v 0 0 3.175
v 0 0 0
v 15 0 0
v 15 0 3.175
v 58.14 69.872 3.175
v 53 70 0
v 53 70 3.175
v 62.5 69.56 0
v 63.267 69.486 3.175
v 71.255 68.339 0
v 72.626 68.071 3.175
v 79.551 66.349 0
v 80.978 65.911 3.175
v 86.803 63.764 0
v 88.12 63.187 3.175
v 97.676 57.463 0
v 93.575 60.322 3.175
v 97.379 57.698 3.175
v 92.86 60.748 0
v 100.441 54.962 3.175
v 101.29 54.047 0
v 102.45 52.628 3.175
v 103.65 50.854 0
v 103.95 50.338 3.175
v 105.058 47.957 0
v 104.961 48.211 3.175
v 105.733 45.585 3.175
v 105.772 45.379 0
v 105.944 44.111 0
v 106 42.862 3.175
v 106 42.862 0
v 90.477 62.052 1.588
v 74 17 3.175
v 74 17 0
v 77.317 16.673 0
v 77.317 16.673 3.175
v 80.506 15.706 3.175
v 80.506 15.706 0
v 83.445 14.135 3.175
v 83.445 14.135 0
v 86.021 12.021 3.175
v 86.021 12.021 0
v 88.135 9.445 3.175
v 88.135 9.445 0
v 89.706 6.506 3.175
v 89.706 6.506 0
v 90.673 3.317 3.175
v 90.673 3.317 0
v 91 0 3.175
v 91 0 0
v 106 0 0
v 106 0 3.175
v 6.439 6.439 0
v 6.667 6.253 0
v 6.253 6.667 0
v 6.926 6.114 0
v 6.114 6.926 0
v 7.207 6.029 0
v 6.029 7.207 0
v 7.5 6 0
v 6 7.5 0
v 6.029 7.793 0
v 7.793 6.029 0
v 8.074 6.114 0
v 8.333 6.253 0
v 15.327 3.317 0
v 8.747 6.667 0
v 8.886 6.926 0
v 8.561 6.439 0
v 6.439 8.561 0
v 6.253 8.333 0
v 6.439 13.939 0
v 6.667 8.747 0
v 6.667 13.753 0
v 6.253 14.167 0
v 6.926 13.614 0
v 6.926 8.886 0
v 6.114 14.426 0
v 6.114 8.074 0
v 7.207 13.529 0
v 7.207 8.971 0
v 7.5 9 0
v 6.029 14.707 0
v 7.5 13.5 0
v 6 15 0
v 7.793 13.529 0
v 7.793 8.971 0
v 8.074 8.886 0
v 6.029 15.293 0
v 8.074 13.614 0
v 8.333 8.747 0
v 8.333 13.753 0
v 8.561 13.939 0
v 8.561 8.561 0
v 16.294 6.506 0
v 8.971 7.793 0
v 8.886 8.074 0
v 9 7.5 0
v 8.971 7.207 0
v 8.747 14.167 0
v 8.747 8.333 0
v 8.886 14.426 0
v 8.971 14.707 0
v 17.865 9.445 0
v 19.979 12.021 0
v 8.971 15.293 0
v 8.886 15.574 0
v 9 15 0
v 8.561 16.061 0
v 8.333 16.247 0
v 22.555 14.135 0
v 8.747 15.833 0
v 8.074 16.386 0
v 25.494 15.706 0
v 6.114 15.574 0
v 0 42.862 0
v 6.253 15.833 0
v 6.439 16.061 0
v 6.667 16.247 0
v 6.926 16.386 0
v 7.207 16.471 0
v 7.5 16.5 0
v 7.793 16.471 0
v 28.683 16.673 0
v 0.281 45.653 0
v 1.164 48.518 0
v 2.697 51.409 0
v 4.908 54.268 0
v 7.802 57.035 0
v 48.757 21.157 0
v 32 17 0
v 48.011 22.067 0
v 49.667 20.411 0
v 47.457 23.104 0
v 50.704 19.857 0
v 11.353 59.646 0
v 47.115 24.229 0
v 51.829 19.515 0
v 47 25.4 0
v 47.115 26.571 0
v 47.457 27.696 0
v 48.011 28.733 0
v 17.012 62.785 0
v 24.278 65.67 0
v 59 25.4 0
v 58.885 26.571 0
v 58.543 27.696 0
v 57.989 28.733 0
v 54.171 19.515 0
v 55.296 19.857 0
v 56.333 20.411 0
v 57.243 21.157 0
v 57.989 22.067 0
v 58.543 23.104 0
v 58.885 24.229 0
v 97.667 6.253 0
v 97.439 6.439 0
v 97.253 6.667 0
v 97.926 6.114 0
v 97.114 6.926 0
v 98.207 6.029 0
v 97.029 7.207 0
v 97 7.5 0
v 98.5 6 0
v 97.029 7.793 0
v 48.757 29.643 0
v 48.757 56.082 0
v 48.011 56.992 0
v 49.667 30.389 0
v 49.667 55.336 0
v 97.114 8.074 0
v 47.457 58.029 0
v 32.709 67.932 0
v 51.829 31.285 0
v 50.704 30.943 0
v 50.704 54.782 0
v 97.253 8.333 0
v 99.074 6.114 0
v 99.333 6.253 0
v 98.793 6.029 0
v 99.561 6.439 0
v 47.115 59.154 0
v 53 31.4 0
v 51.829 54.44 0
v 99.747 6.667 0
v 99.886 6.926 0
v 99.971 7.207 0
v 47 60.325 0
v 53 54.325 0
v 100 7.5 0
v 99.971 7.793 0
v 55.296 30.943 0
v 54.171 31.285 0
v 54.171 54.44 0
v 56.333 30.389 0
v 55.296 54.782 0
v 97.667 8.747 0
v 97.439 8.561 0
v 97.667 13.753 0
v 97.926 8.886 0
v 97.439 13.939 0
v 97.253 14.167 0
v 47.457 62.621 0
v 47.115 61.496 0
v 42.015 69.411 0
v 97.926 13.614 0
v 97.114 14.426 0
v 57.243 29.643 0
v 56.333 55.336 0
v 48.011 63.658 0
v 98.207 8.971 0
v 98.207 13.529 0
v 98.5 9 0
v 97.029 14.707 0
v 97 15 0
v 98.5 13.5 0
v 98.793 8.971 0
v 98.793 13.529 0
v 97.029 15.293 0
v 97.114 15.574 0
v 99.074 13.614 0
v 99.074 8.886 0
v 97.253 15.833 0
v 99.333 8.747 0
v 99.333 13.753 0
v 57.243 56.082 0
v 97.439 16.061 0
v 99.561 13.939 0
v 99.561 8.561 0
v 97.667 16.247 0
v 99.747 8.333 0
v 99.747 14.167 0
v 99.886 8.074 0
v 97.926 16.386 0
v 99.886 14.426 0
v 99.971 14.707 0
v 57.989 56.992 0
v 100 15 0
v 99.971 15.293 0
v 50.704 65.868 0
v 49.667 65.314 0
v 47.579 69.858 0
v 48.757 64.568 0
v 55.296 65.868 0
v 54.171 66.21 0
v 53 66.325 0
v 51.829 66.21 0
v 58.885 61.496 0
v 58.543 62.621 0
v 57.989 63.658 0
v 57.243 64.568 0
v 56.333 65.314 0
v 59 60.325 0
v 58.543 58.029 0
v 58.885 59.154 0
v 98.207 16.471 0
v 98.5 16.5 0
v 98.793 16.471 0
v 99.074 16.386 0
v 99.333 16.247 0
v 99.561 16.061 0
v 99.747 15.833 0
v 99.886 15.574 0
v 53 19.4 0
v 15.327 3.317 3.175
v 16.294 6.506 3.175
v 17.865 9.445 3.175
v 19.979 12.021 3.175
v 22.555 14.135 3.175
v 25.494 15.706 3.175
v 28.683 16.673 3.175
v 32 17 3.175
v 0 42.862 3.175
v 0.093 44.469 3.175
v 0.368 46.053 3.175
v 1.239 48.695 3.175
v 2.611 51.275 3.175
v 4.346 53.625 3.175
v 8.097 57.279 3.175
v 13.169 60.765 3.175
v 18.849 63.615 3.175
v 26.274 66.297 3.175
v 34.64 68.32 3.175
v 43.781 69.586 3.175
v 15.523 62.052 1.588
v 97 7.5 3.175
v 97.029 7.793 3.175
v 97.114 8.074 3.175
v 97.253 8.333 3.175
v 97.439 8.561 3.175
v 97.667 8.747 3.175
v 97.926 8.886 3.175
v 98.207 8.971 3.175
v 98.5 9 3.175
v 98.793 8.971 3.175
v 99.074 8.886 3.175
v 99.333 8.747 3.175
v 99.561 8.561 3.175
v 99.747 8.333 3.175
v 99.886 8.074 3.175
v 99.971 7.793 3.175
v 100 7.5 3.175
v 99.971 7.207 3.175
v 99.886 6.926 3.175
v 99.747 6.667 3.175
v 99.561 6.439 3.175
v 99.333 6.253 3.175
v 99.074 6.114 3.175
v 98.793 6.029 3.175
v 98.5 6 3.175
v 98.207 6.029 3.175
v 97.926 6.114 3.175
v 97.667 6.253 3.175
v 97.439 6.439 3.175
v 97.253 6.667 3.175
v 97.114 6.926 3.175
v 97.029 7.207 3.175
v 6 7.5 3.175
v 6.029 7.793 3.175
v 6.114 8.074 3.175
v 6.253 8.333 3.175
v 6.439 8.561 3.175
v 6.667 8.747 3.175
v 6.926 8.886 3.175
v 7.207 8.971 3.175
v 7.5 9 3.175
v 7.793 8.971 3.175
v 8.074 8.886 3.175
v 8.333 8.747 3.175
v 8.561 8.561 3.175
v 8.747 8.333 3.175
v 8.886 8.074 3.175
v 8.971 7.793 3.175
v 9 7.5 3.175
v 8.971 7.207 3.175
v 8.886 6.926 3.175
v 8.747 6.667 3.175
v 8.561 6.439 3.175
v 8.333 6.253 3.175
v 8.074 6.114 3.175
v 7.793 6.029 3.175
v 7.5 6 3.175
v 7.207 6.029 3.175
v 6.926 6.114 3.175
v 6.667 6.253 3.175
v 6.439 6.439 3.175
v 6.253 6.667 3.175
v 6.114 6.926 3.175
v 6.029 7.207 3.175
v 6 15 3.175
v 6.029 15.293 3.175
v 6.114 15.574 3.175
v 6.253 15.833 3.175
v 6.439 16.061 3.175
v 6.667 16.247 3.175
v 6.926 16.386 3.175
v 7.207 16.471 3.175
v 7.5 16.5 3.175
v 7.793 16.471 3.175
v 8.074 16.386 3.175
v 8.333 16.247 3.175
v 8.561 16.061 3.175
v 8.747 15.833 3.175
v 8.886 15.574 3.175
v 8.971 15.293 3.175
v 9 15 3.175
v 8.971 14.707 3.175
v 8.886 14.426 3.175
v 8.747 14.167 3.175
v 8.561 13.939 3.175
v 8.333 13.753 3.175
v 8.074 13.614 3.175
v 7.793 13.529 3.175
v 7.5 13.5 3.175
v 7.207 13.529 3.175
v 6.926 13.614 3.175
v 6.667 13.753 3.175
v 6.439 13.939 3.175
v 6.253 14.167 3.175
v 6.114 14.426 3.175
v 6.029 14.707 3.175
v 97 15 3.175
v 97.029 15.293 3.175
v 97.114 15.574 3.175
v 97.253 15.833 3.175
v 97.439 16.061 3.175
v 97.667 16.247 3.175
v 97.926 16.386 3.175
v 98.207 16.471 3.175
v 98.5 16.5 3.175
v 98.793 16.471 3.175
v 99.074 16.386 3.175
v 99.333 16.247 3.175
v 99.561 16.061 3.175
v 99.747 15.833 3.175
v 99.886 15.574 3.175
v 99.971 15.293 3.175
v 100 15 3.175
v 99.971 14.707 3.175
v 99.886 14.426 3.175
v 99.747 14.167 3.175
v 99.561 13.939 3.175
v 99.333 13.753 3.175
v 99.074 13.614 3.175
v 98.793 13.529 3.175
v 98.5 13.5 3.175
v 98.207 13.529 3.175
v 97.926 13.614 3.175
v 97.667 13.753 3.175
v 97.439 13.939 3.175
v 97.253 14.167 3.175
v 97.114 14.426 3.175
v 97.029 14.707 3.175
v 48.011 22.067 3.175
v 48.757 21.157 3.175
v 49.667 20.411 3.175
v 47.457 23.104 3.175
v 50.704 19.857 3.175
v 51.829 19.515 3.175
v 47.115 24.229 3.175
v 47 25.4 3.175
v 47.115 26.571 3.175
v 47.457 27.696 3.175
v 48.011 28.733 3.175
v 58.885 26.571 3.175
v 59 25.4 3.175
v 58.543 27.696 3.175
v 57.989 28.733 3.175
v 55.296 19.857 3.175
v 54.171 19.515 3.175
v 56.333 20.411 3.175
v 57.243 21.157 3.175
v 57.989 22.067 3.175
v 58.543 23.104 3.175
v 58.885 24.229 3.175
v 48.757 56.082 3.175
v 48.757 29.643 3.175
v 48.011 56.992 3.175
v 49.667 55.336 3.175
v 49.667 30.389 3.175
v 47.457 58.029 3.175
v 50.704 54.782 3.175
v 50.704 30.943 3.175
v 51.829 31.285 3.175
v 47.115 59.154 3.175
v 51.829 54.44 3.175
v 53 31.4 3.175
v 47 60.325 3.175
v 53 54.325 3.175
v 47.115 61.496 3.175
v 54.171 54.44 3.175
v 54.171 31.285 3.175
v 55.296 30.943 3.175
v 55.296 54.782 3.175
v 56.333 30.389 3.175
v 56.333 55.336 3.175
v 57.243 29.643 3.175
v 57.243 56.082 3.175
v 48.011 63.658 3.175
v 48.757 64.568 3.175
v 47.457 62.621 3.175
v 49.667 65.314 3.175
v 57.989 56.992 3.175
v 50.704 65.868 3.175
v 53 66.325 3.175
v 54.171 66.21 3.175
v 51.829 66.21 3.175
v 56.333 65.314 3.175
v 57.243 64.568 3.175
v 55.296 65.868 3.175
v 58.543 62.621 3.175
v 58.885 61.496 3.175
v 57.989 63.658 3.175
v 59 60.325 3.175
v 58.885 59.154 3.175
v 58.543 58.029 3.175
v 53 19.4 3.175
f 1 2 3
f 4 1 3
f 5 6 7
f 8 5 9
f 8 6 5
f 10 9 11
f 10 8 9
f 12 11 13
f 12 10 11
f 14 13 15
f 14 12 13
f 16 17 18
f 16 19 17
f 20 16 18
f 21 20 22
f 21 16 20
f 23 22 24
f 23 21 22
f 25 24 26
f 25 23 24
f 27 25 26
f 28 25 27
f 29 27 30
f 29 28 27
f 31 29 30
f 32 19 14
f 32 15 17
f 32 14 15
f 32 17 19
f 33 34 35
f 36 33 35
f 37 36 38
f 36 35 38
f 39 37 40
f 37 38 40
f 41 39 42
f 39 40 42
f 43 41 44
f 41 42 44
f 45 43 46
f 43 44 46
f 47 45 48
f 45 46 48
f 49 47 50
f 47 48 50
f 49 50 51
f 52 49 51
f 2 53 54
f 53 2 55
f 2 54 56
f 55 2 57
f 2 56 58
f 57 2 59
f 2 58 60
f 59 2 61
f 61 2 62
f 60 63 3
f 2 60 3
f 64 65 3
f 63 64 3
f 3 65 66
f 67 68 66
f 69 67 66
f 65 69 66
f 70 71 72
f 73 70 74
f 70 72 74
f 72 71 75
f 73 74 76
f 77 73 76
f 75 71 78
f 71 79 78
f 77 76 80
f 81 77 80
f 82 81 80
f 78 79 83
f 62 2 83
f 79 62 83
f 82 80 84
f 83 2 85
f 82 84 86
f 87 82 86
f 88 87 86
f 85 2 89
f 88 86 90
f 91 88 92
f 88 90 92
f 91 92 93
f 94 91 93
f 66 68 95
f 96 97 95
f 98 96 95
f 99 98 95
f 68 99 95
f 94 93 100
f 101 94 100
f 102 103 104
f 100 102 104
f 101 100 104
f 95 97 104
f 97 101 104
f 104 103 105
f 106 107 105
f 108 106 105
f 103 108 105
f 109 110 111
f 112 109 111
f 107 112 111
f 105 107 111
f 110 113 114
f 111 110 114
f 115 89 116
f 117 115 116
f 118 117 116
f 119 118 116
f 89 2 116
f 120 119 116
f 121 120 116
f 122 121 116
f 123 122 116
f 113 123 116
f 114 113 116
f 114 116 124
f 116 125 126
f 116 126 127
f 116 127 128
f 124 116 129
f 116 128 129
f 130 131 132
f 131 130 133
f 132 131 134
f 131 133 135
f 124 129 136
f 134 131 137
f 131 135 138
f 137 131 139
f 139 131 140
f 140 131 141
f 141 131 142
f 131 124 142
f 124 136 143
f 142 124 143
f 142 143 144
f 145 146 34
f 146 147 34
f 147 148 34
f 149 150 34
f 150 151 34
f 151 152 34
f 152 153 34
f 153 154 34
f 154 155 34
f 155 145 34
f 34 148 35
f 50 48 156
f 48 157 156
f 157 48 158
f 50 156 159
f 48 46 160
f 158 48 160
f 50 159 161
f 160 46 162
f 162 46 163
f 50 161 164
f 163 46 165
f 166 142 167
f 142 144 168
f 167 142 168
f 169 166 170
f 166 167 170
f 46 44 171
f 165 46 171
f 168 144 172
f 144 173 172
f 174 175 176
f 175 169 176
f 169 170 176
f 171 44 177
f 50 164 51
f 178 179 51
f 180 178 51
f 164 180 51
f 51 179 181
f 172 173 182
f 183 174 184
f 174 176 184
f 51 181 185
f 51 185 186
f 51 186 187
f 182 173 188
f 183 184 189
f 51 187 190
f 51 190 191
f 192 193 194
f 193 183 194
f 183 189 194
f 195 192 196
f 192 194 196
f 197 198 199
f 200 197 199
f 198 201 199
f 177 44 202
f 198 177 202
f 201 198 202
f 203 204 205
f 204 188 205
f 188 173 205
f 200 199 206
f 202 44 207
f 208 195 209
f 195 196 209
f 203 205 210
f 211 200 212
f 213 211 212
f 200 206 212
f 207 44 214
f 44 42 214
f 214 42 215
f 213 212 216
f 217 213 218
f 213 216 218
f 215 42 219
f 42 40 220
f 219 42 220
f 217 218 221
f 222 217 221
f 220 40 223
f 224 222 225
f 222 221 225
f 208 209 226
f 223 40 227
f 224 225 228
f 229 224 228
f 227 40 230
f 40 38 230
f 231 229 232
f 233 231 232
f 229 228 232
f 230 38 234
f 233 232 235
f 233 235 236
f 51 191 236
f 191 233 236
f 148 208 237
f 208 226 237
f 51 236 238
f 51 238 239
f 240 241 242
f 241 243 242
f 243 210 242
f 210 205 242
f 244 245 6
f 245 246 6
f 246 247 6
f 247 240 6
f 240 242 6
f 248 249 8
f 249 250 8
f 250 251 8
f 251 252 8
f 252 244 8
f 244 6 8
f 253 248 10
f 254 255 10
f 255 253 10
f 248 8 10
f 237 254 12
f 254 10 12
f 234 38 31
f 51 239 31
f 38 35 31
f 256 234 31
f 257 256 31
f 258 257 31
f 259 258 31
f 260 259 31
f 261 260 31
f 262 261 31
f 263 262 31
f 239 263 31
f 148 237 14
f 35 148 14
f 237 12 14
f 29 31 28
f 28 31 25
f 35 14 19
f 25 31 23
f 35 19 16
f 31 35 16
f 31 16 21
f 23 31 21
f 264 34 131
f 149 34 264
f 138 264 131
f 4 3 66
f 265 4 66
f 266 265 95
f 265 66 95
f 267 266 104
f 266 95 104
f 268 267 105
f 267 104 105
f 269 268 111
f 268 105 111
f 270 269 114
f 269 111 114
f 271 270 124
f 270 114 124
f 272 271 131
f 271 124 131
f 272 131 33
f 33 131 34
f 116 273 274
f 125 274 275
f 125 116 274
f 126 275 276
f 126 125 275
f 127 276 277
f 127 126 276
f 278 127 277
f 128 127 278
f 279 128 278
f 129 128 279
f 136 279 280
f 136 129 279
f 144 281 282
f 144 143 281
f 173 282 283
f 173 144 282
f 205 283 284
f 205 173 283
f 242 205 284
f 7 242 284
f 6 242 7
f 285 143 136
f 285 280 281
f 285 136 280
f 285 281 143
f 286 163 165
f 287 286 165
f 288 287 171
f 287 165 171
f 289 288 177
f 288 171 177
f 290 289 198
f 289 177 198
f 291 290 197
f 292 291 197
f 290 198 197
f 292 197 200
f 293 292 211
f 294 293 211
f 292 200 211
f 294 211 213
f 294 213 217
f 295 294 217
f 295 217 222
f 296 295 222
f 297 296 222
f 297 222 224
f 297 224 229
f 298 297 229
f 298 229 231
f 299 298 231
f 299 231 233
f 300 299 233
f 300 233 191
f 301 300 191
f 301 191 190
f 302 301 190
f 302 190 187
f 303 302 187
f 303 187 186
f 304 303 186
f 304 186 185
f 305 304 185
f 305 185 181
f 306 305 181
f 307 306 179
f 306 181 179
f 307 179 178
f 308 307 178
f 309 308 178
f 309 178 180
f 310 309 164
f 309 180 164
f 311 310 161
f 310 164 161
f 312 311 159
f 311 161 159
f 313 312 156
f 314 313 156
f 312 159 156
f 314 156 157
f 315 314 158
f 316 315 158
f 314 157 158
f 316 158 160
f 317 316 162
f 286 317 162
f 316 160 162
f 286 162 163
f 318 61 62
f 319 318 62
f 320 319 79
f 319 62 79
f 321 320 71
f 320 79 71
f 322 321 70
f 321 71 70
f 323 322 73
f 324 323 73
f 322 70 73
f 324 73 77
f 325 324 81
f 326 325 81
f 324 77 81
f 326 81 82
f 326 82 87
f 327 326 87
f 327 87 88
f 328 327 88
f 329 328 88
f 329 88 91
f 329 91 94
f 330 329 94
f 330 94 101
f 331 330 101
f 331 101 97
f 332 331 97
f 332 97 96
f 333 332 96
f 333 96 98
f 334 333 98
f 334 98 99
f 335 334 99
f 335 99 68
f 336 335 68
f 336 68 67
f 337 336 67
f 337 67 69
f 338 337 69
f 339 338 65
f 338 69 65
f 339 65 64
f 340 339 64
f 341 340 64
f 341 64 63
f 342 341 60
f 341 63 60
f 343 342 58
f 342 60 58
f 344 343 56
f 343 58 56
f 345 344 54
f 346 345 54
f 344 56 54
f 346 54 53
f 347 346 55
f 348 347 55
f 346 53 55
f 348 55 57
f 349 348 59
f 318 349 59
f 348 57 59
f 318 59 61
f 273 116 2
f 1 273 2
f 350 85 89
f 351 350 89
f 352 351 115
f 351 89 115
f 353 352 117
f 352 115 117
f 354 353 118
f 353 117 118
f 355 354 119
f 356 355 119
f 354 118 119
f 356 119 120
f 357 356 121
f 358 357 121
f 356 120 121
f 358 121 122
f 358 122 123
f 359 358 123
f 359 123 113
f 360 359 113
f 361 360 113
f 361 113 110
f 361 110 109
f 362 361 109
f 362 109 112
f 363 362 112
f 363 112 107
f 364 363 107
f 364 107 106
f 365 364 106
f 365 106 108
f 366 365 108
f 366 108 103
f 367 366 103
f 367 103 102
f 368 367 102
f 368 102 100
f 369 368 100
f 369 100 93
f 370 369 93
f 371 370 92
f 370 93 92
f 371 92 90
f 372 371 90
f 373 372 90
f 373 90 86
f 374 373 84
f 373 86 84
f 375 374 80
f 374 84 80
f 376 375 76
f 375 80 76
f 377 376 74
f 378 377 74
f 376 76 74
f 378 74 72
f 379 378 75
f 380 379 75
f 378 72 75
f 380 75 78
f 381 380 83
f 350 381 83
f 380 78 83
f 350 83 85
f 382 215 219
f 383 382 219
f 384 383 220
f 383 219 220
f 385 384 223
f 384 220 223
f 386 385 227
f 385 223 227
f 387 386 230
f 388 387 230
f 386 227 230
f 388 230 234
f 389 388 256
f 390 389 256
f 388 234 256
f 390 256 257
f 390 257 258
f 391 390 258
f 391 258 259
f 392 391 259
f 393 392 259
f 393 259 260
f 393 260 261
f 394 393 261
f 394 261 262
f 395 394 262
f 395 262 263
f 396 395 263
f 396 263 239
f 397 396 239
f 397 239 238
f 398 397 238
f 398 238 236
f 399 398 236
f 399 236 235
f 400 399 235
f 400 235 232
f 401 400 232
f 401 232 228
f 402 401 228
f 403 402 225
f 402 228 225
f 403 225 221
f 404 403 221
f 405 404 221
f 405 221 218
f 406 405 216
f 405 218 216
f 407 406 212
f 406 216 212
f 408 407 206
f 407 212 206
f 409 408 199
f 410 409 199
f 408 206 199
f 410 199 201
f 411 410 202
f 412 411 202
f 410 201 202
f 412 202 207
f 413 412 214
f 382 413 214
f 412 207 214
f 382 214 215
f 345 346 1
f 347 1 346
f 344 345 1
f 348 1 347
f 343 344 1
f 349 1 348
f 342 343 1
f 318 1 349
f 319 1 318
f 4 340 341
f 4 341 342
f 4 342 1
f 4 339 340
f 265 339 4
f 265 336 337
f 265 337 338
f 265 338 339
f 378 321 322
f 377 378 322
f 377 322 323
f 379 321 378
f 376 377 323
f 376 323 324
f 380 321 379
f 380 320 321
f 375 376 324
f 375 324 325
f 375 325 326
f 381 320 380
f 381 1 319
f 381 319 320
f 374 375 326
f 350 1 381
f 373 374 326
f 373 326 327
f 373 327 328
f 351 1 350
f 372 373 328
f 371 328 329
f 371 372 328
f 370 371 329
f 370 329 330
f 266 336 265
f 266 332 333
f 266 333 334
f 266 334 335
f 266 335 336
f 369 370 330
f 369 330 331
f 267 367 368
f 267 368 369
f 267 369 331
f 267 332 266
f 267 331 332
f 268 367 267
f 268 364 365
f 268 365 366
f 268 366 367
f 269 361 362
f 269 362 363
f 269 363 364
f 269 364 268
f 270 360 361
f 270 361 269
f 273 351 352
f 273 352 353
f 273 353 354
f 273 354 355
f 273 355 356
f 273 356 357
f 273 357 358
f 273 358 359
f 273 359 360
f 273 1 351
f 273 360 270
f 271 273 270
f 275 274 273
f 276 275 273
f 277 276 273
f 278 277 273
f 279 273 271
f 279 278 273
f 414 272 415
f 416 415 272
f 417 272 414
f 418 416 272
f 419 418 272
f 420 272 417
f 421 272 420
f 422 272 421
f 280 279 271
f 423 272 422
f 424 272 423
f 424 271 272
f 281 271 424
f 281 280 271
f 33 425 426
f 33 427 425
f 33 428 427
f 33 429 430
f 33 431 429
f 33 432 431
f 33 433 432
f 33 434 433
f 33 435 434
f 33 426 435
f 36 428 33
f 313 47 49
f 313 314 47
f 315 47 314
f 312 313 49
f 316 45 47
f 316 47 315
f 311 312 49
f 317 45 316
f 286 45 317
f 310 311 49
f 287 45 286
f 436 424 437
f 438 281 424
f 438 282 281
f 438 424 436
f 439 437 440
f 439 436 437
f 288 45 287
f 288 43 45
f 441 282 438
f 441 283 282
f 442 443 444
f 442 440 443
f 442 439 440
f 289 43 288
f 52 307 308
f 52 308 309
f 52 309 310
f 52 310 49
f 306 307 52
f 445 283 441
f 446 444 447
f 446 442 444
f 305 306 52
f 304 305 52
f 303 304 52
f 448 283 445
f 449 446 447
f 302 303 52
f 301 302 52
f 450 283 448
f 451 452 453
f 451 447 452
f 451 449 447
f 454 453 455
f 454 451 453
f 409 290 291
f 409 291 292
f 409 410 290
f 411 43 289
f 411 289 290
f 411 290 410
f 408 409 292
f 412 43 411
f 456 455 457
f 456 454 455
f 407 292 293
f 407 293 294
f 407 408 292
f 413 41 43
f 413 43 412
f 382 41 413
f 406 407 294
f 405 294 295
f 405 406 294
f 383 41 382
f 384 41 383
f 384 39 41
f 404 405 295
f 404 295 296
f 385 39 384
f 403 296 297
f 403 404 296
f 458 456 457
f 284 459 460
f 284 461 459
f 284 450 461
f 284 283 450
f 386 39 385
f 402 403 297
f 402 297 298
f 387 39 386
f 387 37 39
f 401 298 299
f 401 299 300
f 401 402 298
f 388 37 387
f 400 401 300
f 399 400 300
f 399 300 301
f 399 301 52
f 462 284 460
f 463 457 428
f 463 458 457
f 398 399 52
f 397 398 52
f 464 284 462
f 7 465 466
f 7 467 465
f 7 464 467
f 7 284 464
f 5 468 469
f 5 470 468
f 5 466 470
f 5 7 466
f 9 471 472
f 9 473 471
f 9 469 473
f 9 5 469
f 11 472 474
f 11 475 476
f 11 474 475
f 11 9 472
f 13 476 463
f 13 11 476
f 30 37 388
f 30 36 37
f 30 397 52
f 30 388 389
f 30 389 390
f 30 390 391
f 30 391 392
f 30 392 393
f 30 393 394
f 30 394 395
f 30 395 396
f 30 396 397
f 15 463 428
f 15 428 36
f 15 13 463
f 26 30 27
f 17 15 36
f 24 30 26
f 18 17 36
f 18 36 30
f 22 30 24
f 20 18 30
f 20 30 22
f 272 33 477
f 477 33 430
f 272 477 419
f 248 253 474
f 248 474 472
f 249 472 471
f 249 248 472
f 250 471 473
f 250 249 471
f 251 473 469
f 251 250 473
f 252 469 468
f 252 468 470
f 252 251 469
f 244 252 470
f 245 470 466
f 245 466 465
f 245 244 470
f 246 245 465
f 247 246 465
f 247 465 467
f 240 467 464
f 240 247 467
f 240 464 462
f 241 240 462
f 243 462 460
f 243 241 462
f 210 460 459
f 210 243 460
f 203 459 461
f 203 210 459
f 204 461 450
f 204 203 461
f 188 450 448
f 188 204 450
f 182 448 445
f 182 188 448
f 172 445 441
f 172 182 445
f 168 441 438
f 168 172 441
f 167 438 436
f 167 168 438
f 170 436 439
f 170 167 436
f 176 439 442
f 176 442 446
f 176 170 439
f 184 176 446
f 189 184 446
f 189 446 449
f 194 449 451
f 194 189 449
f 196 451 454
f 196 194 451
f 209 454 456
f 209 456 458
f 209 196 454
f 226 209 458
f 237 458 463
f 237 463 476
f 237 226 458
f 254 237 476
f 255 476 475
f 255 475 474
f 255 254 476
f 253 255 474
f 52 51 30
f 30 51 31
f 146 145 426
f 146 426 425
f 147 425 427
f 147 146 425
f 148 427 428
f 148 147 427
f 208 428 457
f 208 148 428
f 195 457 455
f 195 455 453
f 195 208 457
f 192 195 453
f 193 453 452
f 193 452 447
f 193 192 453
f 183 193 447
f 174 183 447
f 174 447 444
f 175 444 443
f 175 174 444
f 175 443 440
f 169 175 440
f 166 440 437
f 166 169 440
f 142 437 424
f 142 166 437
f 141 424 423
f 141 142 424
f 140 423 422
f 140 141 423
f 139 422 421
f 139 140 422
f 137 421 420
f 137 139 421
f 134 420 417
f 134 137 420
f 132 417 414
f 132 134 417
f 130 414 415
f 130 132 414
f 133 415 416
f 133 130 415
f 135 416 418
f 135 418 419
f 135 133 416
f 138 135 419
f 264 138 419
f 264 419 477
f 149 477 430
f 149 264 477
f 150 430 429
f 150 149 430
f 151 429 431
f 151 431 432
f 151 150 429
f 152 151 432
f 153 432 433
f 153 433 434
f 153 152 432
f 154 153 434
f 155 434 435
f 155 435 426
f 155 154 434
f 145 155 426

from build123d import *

# Parameters (mm, degrees)
SKETCH1_R           = 6
BOSS_EXTRUDE1_DEPTH = 3.175
SKETCH4_R           = 1.5
CUT_EXTRUDE2_DEPTH  = 128.067228761
CUT_EXTRUDE4_DEPTH  = 128.067228761


with BuildPart() as part:
    # Sketch1 → Boss-Extrude1 (new body)
    with BuildSketch(Plane.XY):
        with BuildLine():
            ThreePointArc((15, 0), (19.97918472, 12.02081528), (32, 17))
            Line((32, 17), (53, 17))
            Line((53, 17), (74, 17))
            ThreePointArc((74, 17), (86.02081528, 12.02081528), (91, 0))
            Line((91, 0), (106, 0))
            Line((106, 0), (106, 70))
            Line((106, 70), (0, 70))
            Line((0, 70), (0, 0))
            Line((0, 0), (15, 0))
        make_face()
        with Locations((53, 25.4)):
            Circle(SKETCH1_R, mode=Mode.SUBTRACT)
        with Locations((53, 60.325)):
            Circle(SKETCH1_R, mode=Mode.SUBTRACT)
    extrude(amount=BOSS_EXTRUDE1_DEPTH)

    # Sketch4 → Cut-Extrude2 (cut, through all)
    with BuildSketch(Plane(origin=(0, 0, 0), x_dir=(-1, 0, 0), z_dir=(0, 0, -1))):
        with Locations((-7.5, 15)):
            Circle(SKETCH4_R)
        with Locations((-7.5, 7.5)):
            Circle(SKETCH4_R)
        with Locations((-98.5, 7.5)):
            Circle(SKETCH4_R)
        with Locations((-98.5, 15)):
            Circle(SKETCH4_R)
    extrude(amount=-CUT_EXTRUDE2_DEPTH, mode=Mode.SUBTRACT)

    # Sketch6 → Cut-Extrude4 (cut, through all)
    with BuildSketch(Plane(origin=(0, 0, 0), x_dir=(-1, 0, 0), z_dir=(0, 0, -1))):
        with BuildLine():
            add(Edge.make_bspline(
                [(-53, 70), (-106, 70), (-106, 42.8625)],
                knots=[1.570796327, 1.570796327, 1.570796327, 3.141592654, 3.141592654, 3.141592654], degree=2, weights=[1, 0.707106781, 1]))
            Line((-53, 70), (-106, 70))
            Line((-106, 70), (-106, 42.8625))
        make_face()
        with BuildLine():
            add(Edge.make_bspline(
                [(0, 42.8625), (0, 70), (-53, 70)],
                knots=[0, 0, 0, 1.570796327, 1.570796327, 1.570796327], degree=2, weights=[1, 0.707106781, 1]))
            Line((0, 42.8625), (0, 70))
            Line((0, 70), (-53, 70))
        make_face()
    extrude(amount=-CUT_EXTRUDE4_DEPTH, mode=Mode.SUBTRACT)


solid = part.part
